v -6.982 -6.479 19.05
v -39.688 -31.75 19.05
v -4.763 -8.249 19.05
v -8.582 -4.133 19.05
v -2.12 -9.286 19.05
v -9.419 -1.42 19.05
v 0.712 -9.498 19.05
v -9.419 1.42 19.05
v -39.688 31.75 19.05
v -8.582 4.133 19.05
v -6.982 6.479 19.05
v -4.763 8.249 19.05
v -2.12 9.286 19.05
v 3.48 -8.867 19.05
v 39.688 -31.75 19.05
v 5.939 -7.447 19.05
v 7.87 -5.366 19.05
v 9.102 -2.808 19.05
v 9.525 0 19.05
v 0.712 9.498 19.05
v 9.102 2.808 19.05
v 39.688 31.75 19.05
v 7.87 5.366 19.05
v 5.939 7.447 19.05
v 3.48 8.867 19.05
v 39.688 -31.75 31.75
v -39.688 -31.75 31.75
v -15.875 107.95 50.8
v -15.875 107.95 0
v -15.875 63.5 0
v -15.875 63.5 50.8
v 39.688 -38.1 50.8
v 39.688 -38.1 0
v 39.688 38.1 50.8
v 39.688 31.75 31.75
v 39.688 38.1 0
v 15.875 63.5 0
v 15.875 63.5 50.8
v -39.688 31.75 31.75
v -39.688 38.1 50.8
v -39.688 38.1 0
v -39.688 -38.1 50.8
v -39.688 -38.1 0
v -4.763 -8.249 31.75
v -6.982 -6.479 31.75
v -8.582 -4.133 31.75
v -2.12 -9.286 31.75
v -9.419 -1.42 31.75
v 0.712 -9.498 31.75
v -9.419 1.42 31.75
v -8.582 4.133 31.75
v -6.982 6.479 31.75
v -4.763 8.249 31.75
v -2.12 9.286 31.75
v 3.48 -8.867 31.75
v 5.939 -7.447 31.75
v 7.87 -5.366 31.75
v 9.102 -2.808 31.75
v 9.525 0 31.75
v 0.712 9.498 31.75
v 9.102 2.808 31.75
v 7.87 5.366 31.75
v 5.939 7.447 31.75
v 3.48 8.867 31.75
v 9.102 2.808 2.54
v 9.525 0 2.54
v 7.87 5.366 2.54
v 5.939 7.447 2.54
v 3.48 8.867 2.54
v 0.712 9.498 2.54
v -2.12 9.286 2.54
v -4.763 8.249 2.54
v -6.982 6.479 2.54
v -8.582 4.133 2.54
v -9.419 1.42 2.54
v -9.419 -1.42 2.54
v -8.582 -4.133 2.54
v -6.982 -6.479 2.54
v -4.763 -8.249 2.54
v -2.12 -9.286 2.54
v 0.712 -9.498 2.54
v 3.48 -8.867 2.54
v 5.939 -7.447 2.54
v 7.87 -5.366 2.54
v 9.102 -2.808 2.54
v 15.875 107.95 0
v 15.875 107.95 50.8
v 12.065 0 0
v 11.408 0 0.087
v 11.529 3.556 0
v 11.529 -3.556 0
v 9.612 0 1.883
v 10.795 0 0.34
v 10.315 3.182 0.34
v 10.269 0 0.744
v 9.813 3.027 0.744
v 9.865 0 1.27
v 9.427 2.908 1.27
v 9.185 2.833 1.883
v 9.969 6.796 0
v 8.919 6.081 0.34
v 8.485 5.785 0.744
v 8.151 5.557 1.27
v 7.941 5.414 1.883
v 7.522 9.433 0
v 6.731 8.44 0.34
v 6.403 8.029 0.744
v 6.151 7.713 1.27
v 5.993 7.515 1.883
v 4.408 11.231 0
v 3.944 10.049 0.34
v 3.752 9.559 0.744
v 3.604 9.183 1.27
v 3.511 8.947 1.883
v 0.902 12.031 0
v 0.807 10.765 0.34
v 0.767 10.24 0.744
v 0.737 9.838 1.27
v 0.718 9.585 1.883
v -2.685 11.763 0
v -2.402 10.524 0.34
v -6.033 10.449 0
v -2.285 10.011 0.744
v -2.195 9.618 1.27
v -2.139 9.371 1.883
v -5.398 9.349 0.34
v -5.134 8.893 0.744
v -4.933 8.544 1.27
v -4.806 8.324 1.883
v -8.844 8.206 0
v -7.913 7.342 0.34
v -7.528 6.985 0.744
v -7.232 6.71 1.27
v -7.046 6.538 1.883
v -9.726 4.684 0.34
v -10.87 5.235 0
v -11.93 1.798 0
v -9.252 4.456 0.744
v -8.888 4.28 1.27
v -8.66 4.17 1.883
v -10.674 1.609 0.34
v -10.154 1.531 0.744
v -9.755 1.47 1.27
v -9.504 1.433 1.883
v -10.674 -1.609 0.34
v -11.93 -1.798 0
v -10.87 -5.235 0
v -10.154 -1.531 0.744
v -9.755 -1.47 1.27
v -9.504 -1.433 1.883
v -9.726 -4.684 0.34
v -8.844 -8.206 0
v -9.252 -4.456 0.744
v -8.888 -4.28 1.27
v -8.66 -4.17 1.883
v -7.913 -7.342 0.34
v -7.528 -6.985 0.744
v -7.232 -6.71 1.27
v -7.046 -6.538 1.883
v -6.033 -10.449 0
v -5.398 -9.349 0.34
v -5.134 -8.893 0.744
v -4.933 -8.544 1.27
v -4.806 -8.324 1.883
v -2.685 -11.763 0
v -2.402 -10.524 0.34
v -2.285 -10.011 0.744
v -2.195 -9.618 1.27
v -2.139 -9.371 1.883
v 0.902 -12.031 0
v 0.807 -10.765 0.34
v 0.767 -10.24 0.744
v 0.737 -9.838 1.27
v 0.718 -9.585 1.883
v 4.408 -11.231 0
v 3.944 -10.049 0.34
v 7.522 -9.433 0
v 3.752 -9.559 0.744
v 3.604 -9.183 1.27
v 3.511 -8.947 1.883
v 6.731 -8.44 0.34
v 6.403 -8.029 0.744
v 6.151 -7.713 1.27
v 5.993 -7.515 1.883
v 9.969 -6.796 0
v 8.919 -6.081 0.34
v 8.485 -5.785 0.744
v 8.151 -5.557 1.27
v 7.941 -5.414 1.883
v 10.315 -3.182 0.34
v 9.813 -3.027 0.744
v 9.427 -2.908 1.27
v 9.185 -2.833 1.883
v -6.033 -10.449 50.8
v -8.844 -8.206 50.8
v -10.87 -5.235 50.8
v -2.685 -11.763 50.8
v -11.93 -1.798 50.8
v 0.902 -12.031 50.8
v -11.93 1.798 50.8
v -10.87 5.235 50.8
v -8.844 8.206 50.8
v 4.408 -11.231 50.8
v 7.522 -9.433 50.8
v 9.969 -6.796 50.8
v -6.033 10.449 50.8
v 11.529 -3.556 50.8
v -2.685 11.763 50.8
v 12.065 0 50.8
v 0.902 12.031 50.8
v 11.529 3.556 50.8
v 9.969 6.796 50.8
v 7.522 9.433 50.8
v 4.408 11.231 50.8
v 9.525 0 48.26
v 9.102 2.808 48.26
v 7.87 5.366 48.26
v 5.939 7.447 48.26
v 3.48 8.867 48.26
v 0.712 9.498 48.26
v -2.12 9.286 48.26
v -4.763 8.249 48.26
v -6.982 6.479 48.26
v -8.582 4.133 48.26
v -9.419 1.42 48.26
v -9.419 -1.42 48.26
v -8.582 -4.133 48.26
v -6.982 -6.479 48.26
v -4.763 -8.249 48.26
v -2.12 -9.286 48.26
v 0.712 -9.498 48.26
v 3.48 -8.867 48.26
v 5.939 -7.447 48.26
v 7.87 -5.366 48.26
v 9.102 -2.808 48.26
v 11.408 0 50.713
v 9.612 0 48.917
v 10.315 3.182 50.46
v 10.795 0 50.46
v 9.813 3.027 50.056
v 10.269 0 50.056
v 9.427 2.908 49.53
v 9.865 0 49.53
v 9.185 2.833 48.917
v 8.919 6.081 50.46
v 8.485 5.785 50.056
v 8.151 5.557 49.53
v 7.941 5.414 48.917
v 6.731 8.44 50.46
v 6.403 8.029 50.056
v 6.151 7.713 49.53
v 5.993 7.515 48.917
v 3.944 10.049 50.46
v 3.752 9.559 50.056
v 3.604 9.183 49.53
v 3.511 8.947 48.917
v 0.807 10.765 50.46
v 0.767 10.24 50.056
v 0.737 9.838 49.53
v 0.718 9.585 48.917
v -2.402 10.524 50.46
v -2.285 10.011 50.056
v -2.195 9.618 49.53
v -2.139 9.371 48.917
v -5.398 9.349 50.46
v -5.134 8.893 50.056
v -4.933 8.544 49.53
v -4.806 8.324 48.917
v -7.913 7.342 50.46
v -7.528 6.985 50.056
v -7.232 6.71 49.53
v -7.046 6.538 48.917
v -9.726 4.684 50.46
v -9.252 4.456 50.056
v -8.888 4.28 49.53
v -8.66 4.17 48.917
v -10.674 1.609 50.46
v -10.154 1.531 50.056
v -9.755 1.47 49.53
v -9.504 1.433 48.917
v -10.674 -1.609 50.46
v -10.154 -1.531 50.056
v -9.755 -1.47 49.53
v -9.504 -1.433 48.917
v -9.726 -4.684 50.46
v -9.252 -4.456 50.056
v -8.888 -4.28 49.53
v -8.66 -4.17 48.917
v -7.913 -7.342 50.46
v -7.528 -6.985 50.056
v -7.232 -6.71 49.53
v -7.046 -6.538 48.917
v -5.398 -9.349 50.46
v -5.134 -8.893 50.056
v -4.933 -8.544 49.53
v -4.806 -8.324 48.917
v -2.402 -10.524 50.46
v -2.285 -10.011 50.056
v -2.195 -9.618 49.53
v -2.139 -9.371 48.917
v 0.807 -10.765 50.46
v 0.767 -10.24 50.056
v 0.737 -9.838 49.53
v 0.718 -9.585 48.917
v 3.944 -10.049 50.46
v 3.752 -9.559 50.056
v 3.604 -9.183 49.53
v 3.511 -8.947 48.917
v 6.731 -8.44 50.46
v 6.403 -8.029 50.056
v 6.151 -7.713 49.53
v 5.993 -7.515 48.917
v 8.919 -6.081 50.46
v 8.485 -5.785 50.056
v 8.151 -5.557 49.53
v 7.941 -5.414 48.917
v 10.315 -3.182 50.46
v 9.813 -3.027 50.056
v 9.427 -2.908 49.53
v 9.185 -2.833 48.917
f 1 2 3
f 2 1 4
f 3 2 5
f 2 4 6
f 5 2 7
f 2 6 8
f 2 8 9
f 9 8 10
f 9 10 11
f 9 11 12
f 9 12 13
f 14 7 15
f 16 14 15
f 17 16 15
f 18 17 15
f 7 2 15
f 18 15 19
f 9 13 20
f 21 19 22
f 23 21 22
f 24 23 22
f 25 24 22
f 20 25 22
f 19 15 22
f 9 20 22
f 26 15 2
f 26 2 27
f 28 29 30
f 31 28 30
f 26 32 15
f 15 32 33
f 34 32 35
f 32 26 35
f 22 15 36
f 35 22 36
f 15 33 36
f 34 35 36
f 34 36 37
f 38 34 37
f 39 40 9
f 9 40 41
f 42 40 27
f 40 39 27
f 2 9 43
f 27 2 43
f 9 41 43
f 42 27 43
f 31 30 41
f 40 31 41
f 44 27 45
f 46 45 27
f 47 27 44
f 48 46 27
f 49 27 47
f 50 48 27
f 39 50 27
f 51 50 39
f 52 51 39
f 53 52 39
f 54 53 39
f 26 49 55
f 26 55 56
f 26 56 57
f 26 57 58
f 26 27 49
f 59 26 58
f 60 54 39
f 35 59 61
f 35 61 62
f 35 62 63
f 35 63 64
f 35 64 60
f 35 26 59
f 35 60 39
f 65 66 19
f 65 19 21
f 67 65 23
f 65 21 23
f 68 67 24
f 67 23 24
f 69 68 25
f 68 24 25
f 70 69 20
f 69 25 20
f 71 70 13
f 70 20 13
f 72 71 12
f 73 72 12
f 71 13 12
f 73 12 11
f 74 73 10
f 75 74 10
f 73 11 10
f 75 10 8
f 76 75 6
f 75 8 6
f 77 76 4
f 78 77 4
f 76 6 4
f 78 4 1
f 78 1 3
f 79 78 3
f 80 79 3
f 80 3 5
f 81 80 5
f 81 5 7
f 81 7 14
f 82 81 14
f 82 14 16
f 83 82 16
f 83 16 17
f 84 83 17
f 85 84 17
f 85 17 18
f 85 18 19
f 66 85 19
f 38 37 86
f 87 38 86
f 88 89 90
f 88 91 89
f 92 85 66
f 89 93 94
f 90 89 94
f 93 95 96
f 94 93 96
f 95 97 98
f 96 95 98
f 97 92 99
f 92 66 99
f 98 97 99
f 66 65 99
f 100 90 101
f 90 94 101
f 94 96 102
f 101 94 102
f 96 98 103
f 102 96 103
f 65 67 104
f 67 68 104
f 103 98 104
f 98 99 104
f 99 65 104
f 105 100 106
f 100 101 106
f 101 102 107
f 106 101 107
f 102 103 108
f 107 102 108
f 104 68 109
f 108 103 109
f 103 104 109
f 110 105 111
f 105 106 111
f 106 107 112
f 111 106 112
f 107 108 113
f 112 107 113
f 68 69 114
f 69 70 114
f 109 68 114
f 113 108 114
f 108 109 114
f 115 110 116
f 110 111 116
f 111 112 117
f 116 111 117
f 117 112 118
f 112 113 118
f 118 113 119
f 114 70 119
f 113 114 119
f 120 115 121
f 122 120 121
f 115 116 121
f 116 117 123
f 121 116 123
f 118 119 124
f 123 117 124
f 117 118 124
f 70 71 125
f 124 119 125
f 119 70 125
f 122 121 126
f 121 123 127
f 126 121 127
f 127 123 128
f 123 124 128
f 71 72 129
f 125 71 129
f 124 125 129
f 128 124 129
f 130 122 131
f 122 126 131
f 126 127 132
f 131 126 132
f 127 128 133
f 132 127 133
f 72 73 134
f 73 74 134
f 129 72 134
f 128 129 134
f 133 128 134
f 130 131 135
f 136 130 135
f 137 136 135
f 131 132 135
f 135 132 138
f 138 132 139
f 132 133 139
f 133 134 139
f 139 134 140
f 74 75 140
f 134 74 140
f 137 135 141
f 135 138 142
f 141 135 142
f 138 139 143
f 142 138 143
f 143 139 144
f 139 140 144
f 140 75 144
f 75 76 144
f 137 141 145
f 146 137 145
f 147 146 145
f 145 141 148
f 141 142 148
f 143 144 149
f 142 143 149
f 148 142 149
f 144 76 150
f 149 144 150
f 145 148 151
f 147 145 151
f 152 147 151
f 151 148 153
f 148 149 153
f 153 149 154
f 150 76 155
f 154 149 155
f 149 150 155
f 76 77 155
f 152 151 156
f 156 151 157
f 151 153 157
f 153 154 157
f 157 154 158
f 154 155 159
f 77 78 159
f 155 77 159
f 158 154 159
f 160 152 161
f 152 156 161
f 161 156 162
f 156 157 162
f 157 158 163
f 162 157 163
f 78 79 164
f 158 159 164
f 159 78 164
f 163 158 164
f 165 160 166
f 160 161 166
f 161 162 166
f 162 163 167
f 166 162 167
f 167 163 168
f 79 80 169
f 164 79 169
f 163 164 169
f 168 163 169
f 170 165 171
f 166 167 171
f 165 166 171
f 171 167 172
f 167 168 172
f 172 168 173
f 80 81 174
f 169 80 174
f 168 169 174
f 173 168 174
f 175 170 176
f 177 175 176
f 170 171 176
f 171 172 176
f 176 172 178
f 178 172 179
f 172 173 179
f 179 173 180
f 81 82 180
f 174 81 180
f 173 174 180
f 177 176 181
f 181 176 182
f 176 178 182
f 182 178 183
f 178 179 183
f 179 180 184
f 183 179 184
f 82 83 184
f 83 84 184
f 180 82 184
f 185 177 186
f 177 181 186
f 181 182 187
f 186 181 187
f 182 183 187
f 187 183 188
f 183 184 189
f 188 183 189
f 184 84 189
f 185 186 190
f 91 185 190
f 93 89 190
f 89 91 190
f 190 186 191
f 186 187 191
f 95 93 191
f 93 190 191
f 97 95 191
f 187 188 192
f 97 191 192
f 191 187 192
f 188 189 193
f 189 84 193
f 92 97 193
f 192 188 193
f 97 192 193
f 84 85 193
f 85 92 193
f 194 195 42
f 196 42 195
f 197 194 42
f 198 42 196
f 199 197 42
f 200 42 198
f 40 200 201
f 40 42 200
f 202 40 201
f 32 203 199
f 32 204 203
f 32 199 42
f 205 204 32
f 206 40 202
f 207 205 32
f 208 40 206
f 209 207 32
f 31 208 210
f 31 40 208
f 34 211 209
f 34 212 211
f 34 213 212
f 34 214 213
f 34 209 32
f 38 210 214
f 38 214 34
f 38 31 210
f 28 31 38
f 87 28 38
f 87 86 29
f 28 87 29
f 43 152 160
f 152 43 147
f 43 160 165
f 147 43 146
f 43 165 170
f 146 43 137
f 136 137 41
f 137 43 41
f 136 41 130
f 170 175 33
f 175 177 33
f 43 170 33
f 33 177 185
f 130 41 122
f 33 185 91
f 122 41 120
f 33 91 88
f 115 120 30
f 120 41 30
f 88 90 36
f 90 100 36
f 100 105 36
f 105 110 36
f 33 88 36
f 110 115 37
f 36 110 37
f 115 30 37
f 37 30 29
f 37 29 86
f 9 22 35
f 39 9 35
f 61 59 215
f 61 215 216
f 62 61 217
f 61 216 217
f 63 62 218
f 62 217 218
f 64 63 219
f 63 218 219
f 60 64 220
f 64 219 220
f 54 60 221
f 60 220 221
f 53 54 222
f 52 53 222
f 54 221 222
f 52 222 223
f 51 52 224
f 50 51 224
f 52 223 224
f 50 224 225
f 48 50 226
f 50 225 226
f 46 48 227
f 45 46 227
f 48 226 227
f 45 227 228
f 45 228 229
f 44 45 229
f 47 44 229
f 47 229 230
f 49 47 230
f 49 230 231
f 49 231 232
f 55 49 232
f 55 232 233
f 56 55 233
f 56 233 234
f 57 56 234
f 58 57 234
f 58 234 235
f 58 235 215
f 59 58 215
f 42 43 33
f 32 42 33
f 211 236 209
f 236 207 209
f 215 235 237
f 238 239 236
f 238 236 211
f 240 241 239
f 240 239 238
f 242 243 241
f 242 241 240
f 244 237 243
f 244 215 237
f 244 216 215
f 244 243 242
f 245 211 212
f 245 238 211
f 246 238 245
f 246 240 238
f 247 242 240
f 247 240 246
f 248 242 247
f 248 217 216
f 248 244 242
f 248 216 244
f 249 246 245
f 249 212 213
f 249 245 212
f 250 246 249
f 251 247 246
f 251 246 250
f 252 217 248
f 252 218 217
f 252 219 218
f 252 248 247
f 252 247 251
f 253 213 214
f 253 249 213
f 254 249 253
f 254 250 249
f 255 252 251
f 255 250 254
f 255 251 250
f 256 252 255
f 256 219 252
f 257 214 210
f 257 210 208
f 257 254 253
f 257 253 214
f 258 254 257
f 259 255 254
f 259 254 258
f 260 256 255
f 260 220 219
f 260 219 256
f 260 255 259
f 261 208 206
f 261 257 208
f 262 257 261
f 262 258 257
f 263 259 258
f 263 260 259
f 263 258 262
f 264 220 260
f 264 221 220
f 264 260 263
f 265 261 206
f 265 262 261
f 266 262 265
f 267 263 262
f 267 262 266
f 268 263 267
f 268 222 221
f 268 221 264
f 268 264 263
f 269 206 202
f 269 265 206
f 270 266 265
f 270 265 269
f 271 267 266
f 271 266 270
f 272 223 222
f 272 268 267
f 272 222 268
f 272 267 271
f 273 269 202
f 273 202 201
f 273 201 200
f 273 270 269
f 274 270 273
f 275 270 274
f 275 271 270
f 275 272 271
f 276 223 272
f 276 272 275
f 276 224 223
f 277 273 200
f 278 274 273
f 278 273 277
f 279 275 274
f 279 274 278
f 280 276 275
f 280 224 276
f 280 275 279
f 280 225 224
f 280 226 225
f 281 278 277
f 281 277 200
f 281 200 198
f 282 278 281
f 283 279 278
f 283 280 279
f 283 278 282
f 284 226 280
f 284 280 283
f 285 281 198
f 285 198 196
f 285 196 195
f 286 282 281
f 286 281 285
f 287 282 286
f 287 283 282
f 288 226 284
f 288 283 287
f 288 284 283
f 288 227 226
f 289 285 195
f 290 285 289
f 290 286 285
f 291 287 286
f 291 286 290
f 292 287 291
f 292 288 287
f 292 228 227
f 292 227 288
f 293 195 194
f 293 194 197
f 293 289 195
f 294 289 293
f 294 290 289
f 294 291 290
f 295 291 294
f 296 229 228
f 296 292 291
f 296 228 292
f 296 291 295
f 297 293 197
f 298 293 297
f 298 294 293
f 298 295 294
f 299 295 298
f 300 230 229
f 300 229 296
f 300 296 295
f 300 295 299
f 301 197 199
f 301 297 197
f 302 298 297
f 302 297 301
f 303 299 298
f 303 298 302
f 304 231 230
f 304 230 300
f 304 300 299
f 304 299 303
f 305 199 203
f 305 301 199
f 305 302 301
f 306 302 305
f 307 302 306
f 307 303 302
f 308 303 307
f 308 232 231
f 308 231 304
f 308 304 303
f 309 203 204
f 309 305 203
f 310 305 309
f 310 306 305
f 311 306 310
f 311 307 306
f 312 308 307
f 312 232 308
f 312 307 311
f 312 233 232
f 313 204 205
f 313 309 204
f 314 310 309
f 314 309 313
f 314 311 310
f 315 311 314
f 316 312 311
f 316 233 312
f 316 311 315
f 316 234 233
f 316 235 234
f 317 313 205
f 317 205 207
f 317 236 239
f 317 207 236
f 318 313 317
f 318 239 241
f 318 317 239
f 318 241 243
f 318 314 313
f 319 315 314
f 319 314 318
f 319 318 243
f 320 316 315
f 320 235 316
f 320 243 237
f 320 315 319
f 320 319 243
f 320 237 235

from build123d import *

# Parameters (mm, degrees)
F1_DEPTH      = 50.8
F2_R          = 9.525
F3_DEPTH      = 50.801
F4_R          = 2.54
F5_W          = 63.5
F5_H          = 12.7
F6_DEPTH      = 39.6885
F6_DEPTH_BACK = 39.6885


with BuildPart() as f1:
    # F0 (on Top) → F1 (new body)
    with BuildSketch(Plane.XY):
        Polygon((-39.6875, 38.1), (-39.6875, -38.1), (39.6875, -38.1), (39.6875, 38.1), (15.875, 63.5), (15.875, 107.95), (-15.875, 107.95), (-15.875, 63.5), align=None)
    extrude(amount=F1_DEPTH)

    # F2 (on face) → F3 (cut, through all)
    with BuildSketch(Plane.XY.offset(50.8)):
        Circle(F2_R)
    extrude(amount=-F3_DEPTH, mode=Mode.SUBTRACT)

    # F4
    f4_edges = [f1.edges().sort_by_distance(p)[0] for p in [
        (-9.525, 0, 0),
        (-9.525, 0, 50.8),
        (9.525, 0, 25.4),
    ]]
    fillet(f4_edges, radius=F4_R)

    # F5 (on Right) → F6 (cut, two sides)
    with BuildSketch(Plane.YZ) as f6_sk:
        with Locations((0, 25.4)):
            Rectangle(F5_W, F5_H)
    extrude(amount=-F6_DEPTH, mode=Mode.SUBTRACT)
    extrude(f6_sk.sketch, amount=F6_DEPTH_BACK, mode=Mode.SUBTRACT)


solid = f1.part
